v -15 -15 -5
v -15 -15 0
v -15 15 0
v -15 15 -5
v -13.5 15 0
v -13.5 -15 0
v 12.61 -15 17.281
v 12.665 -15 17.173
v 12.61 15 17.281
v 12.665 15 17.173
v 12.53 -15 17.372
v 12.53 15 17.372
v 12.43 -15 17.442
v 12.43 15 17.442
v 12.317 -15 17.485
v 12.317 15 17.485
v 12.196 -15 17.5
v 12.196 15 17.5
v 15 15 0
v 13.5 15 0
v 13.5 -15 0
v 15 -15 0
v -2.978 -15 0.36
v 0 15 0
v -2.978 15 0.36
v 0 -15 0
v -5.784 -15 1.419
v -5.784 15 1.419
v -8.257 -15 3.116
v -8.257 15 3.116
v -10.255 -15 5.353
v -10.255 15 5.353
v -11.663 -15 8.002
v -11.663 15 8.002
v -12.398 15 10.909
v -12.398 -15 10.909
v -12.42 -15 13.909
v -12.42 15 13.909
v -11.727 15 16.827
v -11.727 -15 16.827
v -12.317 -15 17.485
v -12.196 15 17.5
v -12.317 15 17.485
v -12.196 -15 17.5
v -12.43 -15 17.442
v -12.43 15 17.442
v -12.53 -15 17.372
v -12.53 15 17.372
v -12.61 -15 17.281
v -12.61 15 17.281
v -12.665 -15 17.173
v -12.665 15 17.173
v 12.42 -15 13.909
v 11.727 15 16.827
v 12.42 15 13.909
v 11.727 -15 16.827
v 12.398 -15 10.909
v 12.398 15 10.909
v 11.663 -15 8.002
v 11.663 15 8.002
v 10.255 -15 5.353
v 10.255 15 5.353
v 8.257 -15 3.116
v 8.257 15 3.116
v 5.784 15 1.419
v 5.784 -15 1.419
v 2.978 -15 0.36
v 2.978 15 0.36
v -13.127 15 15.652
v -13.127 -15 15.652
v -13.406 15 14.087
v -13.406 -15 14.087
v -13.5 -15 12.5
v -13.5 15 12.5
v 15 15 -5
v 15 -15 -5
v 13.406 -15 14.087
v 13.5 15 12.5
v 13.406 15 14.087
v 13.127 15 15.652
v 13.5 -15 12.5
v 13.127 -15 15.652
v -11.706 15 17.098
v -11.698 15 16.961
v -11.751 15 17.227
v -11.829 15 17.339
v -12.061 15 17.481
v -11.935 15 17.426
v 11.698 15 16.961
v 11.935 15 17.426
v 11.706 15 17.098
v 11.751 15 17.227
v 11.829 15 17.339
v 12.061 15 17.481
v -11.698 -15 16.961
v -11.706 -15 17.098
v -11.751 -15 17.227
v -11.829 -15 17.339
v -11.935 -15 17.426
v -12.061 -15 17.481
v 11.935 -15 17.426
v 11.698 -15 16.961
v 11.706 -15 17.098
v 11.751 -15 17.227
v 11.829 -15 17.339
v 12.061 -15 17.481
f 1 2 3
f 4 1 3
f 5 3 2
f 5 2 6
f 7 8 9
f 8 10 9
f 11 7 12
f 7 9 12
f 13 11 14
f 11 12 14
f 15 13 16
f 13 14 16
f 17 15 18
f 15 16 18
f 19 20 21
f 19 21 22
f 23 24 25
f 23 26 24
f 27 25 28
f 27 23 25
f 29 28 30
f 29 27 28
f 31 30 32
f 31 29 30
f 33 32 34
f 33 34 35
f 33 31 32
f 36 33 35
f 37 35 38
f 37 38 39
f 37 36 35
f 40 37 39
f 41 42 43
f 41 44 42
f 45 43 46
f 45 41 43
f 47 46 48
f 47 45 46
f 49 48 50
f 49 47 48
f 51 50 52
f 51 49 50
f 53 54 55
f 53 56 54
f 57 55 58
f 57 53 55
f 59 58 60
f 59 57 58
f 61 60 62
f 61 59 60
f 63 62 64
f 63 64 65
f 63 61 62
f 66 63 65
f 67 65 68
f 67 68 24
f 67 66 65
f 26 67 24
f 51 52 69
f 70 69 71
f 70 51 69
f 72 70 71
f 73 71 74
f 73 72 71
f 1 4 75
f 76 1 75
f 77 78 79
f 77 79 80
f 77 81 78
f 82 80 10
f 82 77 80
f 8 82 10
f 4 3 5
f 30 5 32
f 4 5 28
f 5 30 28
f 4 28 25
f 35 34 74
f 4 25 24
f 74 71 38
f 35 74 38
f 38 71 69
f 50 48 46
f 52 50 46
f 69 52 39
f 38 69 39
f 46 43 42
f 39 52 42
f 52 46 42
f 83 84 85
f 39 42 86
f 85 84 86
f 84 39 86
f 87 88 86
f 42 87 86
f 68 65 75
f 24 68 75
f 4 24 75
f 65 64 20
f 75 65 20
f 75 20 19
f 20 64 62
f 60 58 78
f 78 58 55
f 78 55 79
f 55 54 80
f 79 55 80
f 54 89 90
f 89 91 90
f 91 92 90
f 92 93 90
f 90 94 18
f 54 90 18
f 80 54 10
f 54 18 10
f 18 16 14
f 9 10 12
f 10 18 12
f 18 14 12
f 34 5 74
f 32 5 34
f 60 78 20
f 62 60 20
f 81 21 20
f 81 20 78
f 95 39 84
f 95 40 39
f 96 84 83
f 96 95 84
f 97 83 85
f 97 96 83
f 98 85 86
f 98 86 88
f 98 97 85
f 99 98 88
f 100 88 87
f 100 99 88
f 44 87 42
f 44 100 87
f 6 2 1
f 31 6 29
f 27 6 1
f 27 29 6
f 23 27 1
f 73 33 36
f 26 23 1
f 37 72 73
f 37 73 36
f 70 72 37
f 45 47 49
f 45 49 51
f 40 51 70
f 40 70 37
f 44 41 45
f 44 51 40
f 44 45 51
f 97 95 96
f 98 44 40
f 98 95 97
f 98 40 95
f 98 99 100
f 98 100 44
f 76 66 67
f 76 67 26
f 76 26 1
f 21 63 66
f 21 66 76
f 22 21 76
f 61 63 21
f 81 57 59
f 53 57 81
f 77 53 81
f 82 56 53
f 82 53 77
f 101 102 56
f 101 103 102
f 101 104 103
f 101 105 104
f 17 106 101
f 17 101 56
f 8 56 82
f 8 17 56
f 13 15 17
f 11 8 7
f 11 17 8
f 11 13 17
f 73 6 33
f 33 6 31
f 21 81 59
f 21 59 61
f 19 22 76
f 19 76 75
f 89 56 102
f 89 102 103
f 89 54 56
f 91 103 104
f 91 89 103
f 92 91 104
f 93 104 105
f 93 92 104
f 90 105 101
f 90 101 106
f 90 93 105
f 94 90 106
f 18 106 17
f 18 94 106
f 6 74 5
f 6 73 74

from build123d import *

# Parameters (mm, degrees)
F1_W     = 30
F1_H     = 30
F2_DEPTH = 5
F3_DEPTH = 15
F4_R     = 0.49999


# Not quite as in the source:
# - a fillet or chamfer is up to 0.001 mm smaller than in the source, because OpenCascade refuses the exact size


with BuildPart() as f2:
    # F1 (on Top) → F2 (new body)
    with BuildSketch(Plane.XY):
        Rectangle(F1_W, F1_H)
    extrude(amount=-F2_DEPTH)

    # F0 (on Front) → F3 (join, symmetric)
    with BuildSketch(Plane.XZ):
        with BuildLine():
            ThreePointArc((0, 0), (-10.4582503317, 5.6534680312), (-11.4564392374, 17.5))
            Line((-11.4564392374, 17.5), (-12.539936204, 17.5))
            ThreePointArc((-12.539936204, 17.5), (-13.257811636, 15.0456689932), (-13.5, 12.5))
            Line((-13.5, 12.5), (-13.5, 0))
            Line((-13.5, 0), (0, 0))
        make_face()
        with BuildLine():
            ThreePointArc((11.4564392374, 17.5), (10.4582503317, 5.6534680312), (0, 0))
            Line((0, 0), (13.5, 0))
            Line((13.5, 0), (13.5, 12.5))
            ThreePointArc((13.5, 12.5), (13.257811636, 15.0456689932), (12.539936204, 17.5))
            Line((12.539936204, 17.5), (11.4564392374, 17.5))
        make_face()
    extrude(amount=F3_DEPTH, both=True)

    # F4 (radius 0.5 in the source; OpenCascade refuses exactly that, so slightly less here)
    f4_edges = [f2.edges().sort_by_distance(p)[0] for p in [
        (-11.456439, 0, 17.5),
        (12.539936, 0, 17.5),
        (-12.539936, 0, 17.5),
        (11.456439, 0, 17.5),
    ]]
    fillet(f4_edges, radius=F4_R)


solid = f2.part
